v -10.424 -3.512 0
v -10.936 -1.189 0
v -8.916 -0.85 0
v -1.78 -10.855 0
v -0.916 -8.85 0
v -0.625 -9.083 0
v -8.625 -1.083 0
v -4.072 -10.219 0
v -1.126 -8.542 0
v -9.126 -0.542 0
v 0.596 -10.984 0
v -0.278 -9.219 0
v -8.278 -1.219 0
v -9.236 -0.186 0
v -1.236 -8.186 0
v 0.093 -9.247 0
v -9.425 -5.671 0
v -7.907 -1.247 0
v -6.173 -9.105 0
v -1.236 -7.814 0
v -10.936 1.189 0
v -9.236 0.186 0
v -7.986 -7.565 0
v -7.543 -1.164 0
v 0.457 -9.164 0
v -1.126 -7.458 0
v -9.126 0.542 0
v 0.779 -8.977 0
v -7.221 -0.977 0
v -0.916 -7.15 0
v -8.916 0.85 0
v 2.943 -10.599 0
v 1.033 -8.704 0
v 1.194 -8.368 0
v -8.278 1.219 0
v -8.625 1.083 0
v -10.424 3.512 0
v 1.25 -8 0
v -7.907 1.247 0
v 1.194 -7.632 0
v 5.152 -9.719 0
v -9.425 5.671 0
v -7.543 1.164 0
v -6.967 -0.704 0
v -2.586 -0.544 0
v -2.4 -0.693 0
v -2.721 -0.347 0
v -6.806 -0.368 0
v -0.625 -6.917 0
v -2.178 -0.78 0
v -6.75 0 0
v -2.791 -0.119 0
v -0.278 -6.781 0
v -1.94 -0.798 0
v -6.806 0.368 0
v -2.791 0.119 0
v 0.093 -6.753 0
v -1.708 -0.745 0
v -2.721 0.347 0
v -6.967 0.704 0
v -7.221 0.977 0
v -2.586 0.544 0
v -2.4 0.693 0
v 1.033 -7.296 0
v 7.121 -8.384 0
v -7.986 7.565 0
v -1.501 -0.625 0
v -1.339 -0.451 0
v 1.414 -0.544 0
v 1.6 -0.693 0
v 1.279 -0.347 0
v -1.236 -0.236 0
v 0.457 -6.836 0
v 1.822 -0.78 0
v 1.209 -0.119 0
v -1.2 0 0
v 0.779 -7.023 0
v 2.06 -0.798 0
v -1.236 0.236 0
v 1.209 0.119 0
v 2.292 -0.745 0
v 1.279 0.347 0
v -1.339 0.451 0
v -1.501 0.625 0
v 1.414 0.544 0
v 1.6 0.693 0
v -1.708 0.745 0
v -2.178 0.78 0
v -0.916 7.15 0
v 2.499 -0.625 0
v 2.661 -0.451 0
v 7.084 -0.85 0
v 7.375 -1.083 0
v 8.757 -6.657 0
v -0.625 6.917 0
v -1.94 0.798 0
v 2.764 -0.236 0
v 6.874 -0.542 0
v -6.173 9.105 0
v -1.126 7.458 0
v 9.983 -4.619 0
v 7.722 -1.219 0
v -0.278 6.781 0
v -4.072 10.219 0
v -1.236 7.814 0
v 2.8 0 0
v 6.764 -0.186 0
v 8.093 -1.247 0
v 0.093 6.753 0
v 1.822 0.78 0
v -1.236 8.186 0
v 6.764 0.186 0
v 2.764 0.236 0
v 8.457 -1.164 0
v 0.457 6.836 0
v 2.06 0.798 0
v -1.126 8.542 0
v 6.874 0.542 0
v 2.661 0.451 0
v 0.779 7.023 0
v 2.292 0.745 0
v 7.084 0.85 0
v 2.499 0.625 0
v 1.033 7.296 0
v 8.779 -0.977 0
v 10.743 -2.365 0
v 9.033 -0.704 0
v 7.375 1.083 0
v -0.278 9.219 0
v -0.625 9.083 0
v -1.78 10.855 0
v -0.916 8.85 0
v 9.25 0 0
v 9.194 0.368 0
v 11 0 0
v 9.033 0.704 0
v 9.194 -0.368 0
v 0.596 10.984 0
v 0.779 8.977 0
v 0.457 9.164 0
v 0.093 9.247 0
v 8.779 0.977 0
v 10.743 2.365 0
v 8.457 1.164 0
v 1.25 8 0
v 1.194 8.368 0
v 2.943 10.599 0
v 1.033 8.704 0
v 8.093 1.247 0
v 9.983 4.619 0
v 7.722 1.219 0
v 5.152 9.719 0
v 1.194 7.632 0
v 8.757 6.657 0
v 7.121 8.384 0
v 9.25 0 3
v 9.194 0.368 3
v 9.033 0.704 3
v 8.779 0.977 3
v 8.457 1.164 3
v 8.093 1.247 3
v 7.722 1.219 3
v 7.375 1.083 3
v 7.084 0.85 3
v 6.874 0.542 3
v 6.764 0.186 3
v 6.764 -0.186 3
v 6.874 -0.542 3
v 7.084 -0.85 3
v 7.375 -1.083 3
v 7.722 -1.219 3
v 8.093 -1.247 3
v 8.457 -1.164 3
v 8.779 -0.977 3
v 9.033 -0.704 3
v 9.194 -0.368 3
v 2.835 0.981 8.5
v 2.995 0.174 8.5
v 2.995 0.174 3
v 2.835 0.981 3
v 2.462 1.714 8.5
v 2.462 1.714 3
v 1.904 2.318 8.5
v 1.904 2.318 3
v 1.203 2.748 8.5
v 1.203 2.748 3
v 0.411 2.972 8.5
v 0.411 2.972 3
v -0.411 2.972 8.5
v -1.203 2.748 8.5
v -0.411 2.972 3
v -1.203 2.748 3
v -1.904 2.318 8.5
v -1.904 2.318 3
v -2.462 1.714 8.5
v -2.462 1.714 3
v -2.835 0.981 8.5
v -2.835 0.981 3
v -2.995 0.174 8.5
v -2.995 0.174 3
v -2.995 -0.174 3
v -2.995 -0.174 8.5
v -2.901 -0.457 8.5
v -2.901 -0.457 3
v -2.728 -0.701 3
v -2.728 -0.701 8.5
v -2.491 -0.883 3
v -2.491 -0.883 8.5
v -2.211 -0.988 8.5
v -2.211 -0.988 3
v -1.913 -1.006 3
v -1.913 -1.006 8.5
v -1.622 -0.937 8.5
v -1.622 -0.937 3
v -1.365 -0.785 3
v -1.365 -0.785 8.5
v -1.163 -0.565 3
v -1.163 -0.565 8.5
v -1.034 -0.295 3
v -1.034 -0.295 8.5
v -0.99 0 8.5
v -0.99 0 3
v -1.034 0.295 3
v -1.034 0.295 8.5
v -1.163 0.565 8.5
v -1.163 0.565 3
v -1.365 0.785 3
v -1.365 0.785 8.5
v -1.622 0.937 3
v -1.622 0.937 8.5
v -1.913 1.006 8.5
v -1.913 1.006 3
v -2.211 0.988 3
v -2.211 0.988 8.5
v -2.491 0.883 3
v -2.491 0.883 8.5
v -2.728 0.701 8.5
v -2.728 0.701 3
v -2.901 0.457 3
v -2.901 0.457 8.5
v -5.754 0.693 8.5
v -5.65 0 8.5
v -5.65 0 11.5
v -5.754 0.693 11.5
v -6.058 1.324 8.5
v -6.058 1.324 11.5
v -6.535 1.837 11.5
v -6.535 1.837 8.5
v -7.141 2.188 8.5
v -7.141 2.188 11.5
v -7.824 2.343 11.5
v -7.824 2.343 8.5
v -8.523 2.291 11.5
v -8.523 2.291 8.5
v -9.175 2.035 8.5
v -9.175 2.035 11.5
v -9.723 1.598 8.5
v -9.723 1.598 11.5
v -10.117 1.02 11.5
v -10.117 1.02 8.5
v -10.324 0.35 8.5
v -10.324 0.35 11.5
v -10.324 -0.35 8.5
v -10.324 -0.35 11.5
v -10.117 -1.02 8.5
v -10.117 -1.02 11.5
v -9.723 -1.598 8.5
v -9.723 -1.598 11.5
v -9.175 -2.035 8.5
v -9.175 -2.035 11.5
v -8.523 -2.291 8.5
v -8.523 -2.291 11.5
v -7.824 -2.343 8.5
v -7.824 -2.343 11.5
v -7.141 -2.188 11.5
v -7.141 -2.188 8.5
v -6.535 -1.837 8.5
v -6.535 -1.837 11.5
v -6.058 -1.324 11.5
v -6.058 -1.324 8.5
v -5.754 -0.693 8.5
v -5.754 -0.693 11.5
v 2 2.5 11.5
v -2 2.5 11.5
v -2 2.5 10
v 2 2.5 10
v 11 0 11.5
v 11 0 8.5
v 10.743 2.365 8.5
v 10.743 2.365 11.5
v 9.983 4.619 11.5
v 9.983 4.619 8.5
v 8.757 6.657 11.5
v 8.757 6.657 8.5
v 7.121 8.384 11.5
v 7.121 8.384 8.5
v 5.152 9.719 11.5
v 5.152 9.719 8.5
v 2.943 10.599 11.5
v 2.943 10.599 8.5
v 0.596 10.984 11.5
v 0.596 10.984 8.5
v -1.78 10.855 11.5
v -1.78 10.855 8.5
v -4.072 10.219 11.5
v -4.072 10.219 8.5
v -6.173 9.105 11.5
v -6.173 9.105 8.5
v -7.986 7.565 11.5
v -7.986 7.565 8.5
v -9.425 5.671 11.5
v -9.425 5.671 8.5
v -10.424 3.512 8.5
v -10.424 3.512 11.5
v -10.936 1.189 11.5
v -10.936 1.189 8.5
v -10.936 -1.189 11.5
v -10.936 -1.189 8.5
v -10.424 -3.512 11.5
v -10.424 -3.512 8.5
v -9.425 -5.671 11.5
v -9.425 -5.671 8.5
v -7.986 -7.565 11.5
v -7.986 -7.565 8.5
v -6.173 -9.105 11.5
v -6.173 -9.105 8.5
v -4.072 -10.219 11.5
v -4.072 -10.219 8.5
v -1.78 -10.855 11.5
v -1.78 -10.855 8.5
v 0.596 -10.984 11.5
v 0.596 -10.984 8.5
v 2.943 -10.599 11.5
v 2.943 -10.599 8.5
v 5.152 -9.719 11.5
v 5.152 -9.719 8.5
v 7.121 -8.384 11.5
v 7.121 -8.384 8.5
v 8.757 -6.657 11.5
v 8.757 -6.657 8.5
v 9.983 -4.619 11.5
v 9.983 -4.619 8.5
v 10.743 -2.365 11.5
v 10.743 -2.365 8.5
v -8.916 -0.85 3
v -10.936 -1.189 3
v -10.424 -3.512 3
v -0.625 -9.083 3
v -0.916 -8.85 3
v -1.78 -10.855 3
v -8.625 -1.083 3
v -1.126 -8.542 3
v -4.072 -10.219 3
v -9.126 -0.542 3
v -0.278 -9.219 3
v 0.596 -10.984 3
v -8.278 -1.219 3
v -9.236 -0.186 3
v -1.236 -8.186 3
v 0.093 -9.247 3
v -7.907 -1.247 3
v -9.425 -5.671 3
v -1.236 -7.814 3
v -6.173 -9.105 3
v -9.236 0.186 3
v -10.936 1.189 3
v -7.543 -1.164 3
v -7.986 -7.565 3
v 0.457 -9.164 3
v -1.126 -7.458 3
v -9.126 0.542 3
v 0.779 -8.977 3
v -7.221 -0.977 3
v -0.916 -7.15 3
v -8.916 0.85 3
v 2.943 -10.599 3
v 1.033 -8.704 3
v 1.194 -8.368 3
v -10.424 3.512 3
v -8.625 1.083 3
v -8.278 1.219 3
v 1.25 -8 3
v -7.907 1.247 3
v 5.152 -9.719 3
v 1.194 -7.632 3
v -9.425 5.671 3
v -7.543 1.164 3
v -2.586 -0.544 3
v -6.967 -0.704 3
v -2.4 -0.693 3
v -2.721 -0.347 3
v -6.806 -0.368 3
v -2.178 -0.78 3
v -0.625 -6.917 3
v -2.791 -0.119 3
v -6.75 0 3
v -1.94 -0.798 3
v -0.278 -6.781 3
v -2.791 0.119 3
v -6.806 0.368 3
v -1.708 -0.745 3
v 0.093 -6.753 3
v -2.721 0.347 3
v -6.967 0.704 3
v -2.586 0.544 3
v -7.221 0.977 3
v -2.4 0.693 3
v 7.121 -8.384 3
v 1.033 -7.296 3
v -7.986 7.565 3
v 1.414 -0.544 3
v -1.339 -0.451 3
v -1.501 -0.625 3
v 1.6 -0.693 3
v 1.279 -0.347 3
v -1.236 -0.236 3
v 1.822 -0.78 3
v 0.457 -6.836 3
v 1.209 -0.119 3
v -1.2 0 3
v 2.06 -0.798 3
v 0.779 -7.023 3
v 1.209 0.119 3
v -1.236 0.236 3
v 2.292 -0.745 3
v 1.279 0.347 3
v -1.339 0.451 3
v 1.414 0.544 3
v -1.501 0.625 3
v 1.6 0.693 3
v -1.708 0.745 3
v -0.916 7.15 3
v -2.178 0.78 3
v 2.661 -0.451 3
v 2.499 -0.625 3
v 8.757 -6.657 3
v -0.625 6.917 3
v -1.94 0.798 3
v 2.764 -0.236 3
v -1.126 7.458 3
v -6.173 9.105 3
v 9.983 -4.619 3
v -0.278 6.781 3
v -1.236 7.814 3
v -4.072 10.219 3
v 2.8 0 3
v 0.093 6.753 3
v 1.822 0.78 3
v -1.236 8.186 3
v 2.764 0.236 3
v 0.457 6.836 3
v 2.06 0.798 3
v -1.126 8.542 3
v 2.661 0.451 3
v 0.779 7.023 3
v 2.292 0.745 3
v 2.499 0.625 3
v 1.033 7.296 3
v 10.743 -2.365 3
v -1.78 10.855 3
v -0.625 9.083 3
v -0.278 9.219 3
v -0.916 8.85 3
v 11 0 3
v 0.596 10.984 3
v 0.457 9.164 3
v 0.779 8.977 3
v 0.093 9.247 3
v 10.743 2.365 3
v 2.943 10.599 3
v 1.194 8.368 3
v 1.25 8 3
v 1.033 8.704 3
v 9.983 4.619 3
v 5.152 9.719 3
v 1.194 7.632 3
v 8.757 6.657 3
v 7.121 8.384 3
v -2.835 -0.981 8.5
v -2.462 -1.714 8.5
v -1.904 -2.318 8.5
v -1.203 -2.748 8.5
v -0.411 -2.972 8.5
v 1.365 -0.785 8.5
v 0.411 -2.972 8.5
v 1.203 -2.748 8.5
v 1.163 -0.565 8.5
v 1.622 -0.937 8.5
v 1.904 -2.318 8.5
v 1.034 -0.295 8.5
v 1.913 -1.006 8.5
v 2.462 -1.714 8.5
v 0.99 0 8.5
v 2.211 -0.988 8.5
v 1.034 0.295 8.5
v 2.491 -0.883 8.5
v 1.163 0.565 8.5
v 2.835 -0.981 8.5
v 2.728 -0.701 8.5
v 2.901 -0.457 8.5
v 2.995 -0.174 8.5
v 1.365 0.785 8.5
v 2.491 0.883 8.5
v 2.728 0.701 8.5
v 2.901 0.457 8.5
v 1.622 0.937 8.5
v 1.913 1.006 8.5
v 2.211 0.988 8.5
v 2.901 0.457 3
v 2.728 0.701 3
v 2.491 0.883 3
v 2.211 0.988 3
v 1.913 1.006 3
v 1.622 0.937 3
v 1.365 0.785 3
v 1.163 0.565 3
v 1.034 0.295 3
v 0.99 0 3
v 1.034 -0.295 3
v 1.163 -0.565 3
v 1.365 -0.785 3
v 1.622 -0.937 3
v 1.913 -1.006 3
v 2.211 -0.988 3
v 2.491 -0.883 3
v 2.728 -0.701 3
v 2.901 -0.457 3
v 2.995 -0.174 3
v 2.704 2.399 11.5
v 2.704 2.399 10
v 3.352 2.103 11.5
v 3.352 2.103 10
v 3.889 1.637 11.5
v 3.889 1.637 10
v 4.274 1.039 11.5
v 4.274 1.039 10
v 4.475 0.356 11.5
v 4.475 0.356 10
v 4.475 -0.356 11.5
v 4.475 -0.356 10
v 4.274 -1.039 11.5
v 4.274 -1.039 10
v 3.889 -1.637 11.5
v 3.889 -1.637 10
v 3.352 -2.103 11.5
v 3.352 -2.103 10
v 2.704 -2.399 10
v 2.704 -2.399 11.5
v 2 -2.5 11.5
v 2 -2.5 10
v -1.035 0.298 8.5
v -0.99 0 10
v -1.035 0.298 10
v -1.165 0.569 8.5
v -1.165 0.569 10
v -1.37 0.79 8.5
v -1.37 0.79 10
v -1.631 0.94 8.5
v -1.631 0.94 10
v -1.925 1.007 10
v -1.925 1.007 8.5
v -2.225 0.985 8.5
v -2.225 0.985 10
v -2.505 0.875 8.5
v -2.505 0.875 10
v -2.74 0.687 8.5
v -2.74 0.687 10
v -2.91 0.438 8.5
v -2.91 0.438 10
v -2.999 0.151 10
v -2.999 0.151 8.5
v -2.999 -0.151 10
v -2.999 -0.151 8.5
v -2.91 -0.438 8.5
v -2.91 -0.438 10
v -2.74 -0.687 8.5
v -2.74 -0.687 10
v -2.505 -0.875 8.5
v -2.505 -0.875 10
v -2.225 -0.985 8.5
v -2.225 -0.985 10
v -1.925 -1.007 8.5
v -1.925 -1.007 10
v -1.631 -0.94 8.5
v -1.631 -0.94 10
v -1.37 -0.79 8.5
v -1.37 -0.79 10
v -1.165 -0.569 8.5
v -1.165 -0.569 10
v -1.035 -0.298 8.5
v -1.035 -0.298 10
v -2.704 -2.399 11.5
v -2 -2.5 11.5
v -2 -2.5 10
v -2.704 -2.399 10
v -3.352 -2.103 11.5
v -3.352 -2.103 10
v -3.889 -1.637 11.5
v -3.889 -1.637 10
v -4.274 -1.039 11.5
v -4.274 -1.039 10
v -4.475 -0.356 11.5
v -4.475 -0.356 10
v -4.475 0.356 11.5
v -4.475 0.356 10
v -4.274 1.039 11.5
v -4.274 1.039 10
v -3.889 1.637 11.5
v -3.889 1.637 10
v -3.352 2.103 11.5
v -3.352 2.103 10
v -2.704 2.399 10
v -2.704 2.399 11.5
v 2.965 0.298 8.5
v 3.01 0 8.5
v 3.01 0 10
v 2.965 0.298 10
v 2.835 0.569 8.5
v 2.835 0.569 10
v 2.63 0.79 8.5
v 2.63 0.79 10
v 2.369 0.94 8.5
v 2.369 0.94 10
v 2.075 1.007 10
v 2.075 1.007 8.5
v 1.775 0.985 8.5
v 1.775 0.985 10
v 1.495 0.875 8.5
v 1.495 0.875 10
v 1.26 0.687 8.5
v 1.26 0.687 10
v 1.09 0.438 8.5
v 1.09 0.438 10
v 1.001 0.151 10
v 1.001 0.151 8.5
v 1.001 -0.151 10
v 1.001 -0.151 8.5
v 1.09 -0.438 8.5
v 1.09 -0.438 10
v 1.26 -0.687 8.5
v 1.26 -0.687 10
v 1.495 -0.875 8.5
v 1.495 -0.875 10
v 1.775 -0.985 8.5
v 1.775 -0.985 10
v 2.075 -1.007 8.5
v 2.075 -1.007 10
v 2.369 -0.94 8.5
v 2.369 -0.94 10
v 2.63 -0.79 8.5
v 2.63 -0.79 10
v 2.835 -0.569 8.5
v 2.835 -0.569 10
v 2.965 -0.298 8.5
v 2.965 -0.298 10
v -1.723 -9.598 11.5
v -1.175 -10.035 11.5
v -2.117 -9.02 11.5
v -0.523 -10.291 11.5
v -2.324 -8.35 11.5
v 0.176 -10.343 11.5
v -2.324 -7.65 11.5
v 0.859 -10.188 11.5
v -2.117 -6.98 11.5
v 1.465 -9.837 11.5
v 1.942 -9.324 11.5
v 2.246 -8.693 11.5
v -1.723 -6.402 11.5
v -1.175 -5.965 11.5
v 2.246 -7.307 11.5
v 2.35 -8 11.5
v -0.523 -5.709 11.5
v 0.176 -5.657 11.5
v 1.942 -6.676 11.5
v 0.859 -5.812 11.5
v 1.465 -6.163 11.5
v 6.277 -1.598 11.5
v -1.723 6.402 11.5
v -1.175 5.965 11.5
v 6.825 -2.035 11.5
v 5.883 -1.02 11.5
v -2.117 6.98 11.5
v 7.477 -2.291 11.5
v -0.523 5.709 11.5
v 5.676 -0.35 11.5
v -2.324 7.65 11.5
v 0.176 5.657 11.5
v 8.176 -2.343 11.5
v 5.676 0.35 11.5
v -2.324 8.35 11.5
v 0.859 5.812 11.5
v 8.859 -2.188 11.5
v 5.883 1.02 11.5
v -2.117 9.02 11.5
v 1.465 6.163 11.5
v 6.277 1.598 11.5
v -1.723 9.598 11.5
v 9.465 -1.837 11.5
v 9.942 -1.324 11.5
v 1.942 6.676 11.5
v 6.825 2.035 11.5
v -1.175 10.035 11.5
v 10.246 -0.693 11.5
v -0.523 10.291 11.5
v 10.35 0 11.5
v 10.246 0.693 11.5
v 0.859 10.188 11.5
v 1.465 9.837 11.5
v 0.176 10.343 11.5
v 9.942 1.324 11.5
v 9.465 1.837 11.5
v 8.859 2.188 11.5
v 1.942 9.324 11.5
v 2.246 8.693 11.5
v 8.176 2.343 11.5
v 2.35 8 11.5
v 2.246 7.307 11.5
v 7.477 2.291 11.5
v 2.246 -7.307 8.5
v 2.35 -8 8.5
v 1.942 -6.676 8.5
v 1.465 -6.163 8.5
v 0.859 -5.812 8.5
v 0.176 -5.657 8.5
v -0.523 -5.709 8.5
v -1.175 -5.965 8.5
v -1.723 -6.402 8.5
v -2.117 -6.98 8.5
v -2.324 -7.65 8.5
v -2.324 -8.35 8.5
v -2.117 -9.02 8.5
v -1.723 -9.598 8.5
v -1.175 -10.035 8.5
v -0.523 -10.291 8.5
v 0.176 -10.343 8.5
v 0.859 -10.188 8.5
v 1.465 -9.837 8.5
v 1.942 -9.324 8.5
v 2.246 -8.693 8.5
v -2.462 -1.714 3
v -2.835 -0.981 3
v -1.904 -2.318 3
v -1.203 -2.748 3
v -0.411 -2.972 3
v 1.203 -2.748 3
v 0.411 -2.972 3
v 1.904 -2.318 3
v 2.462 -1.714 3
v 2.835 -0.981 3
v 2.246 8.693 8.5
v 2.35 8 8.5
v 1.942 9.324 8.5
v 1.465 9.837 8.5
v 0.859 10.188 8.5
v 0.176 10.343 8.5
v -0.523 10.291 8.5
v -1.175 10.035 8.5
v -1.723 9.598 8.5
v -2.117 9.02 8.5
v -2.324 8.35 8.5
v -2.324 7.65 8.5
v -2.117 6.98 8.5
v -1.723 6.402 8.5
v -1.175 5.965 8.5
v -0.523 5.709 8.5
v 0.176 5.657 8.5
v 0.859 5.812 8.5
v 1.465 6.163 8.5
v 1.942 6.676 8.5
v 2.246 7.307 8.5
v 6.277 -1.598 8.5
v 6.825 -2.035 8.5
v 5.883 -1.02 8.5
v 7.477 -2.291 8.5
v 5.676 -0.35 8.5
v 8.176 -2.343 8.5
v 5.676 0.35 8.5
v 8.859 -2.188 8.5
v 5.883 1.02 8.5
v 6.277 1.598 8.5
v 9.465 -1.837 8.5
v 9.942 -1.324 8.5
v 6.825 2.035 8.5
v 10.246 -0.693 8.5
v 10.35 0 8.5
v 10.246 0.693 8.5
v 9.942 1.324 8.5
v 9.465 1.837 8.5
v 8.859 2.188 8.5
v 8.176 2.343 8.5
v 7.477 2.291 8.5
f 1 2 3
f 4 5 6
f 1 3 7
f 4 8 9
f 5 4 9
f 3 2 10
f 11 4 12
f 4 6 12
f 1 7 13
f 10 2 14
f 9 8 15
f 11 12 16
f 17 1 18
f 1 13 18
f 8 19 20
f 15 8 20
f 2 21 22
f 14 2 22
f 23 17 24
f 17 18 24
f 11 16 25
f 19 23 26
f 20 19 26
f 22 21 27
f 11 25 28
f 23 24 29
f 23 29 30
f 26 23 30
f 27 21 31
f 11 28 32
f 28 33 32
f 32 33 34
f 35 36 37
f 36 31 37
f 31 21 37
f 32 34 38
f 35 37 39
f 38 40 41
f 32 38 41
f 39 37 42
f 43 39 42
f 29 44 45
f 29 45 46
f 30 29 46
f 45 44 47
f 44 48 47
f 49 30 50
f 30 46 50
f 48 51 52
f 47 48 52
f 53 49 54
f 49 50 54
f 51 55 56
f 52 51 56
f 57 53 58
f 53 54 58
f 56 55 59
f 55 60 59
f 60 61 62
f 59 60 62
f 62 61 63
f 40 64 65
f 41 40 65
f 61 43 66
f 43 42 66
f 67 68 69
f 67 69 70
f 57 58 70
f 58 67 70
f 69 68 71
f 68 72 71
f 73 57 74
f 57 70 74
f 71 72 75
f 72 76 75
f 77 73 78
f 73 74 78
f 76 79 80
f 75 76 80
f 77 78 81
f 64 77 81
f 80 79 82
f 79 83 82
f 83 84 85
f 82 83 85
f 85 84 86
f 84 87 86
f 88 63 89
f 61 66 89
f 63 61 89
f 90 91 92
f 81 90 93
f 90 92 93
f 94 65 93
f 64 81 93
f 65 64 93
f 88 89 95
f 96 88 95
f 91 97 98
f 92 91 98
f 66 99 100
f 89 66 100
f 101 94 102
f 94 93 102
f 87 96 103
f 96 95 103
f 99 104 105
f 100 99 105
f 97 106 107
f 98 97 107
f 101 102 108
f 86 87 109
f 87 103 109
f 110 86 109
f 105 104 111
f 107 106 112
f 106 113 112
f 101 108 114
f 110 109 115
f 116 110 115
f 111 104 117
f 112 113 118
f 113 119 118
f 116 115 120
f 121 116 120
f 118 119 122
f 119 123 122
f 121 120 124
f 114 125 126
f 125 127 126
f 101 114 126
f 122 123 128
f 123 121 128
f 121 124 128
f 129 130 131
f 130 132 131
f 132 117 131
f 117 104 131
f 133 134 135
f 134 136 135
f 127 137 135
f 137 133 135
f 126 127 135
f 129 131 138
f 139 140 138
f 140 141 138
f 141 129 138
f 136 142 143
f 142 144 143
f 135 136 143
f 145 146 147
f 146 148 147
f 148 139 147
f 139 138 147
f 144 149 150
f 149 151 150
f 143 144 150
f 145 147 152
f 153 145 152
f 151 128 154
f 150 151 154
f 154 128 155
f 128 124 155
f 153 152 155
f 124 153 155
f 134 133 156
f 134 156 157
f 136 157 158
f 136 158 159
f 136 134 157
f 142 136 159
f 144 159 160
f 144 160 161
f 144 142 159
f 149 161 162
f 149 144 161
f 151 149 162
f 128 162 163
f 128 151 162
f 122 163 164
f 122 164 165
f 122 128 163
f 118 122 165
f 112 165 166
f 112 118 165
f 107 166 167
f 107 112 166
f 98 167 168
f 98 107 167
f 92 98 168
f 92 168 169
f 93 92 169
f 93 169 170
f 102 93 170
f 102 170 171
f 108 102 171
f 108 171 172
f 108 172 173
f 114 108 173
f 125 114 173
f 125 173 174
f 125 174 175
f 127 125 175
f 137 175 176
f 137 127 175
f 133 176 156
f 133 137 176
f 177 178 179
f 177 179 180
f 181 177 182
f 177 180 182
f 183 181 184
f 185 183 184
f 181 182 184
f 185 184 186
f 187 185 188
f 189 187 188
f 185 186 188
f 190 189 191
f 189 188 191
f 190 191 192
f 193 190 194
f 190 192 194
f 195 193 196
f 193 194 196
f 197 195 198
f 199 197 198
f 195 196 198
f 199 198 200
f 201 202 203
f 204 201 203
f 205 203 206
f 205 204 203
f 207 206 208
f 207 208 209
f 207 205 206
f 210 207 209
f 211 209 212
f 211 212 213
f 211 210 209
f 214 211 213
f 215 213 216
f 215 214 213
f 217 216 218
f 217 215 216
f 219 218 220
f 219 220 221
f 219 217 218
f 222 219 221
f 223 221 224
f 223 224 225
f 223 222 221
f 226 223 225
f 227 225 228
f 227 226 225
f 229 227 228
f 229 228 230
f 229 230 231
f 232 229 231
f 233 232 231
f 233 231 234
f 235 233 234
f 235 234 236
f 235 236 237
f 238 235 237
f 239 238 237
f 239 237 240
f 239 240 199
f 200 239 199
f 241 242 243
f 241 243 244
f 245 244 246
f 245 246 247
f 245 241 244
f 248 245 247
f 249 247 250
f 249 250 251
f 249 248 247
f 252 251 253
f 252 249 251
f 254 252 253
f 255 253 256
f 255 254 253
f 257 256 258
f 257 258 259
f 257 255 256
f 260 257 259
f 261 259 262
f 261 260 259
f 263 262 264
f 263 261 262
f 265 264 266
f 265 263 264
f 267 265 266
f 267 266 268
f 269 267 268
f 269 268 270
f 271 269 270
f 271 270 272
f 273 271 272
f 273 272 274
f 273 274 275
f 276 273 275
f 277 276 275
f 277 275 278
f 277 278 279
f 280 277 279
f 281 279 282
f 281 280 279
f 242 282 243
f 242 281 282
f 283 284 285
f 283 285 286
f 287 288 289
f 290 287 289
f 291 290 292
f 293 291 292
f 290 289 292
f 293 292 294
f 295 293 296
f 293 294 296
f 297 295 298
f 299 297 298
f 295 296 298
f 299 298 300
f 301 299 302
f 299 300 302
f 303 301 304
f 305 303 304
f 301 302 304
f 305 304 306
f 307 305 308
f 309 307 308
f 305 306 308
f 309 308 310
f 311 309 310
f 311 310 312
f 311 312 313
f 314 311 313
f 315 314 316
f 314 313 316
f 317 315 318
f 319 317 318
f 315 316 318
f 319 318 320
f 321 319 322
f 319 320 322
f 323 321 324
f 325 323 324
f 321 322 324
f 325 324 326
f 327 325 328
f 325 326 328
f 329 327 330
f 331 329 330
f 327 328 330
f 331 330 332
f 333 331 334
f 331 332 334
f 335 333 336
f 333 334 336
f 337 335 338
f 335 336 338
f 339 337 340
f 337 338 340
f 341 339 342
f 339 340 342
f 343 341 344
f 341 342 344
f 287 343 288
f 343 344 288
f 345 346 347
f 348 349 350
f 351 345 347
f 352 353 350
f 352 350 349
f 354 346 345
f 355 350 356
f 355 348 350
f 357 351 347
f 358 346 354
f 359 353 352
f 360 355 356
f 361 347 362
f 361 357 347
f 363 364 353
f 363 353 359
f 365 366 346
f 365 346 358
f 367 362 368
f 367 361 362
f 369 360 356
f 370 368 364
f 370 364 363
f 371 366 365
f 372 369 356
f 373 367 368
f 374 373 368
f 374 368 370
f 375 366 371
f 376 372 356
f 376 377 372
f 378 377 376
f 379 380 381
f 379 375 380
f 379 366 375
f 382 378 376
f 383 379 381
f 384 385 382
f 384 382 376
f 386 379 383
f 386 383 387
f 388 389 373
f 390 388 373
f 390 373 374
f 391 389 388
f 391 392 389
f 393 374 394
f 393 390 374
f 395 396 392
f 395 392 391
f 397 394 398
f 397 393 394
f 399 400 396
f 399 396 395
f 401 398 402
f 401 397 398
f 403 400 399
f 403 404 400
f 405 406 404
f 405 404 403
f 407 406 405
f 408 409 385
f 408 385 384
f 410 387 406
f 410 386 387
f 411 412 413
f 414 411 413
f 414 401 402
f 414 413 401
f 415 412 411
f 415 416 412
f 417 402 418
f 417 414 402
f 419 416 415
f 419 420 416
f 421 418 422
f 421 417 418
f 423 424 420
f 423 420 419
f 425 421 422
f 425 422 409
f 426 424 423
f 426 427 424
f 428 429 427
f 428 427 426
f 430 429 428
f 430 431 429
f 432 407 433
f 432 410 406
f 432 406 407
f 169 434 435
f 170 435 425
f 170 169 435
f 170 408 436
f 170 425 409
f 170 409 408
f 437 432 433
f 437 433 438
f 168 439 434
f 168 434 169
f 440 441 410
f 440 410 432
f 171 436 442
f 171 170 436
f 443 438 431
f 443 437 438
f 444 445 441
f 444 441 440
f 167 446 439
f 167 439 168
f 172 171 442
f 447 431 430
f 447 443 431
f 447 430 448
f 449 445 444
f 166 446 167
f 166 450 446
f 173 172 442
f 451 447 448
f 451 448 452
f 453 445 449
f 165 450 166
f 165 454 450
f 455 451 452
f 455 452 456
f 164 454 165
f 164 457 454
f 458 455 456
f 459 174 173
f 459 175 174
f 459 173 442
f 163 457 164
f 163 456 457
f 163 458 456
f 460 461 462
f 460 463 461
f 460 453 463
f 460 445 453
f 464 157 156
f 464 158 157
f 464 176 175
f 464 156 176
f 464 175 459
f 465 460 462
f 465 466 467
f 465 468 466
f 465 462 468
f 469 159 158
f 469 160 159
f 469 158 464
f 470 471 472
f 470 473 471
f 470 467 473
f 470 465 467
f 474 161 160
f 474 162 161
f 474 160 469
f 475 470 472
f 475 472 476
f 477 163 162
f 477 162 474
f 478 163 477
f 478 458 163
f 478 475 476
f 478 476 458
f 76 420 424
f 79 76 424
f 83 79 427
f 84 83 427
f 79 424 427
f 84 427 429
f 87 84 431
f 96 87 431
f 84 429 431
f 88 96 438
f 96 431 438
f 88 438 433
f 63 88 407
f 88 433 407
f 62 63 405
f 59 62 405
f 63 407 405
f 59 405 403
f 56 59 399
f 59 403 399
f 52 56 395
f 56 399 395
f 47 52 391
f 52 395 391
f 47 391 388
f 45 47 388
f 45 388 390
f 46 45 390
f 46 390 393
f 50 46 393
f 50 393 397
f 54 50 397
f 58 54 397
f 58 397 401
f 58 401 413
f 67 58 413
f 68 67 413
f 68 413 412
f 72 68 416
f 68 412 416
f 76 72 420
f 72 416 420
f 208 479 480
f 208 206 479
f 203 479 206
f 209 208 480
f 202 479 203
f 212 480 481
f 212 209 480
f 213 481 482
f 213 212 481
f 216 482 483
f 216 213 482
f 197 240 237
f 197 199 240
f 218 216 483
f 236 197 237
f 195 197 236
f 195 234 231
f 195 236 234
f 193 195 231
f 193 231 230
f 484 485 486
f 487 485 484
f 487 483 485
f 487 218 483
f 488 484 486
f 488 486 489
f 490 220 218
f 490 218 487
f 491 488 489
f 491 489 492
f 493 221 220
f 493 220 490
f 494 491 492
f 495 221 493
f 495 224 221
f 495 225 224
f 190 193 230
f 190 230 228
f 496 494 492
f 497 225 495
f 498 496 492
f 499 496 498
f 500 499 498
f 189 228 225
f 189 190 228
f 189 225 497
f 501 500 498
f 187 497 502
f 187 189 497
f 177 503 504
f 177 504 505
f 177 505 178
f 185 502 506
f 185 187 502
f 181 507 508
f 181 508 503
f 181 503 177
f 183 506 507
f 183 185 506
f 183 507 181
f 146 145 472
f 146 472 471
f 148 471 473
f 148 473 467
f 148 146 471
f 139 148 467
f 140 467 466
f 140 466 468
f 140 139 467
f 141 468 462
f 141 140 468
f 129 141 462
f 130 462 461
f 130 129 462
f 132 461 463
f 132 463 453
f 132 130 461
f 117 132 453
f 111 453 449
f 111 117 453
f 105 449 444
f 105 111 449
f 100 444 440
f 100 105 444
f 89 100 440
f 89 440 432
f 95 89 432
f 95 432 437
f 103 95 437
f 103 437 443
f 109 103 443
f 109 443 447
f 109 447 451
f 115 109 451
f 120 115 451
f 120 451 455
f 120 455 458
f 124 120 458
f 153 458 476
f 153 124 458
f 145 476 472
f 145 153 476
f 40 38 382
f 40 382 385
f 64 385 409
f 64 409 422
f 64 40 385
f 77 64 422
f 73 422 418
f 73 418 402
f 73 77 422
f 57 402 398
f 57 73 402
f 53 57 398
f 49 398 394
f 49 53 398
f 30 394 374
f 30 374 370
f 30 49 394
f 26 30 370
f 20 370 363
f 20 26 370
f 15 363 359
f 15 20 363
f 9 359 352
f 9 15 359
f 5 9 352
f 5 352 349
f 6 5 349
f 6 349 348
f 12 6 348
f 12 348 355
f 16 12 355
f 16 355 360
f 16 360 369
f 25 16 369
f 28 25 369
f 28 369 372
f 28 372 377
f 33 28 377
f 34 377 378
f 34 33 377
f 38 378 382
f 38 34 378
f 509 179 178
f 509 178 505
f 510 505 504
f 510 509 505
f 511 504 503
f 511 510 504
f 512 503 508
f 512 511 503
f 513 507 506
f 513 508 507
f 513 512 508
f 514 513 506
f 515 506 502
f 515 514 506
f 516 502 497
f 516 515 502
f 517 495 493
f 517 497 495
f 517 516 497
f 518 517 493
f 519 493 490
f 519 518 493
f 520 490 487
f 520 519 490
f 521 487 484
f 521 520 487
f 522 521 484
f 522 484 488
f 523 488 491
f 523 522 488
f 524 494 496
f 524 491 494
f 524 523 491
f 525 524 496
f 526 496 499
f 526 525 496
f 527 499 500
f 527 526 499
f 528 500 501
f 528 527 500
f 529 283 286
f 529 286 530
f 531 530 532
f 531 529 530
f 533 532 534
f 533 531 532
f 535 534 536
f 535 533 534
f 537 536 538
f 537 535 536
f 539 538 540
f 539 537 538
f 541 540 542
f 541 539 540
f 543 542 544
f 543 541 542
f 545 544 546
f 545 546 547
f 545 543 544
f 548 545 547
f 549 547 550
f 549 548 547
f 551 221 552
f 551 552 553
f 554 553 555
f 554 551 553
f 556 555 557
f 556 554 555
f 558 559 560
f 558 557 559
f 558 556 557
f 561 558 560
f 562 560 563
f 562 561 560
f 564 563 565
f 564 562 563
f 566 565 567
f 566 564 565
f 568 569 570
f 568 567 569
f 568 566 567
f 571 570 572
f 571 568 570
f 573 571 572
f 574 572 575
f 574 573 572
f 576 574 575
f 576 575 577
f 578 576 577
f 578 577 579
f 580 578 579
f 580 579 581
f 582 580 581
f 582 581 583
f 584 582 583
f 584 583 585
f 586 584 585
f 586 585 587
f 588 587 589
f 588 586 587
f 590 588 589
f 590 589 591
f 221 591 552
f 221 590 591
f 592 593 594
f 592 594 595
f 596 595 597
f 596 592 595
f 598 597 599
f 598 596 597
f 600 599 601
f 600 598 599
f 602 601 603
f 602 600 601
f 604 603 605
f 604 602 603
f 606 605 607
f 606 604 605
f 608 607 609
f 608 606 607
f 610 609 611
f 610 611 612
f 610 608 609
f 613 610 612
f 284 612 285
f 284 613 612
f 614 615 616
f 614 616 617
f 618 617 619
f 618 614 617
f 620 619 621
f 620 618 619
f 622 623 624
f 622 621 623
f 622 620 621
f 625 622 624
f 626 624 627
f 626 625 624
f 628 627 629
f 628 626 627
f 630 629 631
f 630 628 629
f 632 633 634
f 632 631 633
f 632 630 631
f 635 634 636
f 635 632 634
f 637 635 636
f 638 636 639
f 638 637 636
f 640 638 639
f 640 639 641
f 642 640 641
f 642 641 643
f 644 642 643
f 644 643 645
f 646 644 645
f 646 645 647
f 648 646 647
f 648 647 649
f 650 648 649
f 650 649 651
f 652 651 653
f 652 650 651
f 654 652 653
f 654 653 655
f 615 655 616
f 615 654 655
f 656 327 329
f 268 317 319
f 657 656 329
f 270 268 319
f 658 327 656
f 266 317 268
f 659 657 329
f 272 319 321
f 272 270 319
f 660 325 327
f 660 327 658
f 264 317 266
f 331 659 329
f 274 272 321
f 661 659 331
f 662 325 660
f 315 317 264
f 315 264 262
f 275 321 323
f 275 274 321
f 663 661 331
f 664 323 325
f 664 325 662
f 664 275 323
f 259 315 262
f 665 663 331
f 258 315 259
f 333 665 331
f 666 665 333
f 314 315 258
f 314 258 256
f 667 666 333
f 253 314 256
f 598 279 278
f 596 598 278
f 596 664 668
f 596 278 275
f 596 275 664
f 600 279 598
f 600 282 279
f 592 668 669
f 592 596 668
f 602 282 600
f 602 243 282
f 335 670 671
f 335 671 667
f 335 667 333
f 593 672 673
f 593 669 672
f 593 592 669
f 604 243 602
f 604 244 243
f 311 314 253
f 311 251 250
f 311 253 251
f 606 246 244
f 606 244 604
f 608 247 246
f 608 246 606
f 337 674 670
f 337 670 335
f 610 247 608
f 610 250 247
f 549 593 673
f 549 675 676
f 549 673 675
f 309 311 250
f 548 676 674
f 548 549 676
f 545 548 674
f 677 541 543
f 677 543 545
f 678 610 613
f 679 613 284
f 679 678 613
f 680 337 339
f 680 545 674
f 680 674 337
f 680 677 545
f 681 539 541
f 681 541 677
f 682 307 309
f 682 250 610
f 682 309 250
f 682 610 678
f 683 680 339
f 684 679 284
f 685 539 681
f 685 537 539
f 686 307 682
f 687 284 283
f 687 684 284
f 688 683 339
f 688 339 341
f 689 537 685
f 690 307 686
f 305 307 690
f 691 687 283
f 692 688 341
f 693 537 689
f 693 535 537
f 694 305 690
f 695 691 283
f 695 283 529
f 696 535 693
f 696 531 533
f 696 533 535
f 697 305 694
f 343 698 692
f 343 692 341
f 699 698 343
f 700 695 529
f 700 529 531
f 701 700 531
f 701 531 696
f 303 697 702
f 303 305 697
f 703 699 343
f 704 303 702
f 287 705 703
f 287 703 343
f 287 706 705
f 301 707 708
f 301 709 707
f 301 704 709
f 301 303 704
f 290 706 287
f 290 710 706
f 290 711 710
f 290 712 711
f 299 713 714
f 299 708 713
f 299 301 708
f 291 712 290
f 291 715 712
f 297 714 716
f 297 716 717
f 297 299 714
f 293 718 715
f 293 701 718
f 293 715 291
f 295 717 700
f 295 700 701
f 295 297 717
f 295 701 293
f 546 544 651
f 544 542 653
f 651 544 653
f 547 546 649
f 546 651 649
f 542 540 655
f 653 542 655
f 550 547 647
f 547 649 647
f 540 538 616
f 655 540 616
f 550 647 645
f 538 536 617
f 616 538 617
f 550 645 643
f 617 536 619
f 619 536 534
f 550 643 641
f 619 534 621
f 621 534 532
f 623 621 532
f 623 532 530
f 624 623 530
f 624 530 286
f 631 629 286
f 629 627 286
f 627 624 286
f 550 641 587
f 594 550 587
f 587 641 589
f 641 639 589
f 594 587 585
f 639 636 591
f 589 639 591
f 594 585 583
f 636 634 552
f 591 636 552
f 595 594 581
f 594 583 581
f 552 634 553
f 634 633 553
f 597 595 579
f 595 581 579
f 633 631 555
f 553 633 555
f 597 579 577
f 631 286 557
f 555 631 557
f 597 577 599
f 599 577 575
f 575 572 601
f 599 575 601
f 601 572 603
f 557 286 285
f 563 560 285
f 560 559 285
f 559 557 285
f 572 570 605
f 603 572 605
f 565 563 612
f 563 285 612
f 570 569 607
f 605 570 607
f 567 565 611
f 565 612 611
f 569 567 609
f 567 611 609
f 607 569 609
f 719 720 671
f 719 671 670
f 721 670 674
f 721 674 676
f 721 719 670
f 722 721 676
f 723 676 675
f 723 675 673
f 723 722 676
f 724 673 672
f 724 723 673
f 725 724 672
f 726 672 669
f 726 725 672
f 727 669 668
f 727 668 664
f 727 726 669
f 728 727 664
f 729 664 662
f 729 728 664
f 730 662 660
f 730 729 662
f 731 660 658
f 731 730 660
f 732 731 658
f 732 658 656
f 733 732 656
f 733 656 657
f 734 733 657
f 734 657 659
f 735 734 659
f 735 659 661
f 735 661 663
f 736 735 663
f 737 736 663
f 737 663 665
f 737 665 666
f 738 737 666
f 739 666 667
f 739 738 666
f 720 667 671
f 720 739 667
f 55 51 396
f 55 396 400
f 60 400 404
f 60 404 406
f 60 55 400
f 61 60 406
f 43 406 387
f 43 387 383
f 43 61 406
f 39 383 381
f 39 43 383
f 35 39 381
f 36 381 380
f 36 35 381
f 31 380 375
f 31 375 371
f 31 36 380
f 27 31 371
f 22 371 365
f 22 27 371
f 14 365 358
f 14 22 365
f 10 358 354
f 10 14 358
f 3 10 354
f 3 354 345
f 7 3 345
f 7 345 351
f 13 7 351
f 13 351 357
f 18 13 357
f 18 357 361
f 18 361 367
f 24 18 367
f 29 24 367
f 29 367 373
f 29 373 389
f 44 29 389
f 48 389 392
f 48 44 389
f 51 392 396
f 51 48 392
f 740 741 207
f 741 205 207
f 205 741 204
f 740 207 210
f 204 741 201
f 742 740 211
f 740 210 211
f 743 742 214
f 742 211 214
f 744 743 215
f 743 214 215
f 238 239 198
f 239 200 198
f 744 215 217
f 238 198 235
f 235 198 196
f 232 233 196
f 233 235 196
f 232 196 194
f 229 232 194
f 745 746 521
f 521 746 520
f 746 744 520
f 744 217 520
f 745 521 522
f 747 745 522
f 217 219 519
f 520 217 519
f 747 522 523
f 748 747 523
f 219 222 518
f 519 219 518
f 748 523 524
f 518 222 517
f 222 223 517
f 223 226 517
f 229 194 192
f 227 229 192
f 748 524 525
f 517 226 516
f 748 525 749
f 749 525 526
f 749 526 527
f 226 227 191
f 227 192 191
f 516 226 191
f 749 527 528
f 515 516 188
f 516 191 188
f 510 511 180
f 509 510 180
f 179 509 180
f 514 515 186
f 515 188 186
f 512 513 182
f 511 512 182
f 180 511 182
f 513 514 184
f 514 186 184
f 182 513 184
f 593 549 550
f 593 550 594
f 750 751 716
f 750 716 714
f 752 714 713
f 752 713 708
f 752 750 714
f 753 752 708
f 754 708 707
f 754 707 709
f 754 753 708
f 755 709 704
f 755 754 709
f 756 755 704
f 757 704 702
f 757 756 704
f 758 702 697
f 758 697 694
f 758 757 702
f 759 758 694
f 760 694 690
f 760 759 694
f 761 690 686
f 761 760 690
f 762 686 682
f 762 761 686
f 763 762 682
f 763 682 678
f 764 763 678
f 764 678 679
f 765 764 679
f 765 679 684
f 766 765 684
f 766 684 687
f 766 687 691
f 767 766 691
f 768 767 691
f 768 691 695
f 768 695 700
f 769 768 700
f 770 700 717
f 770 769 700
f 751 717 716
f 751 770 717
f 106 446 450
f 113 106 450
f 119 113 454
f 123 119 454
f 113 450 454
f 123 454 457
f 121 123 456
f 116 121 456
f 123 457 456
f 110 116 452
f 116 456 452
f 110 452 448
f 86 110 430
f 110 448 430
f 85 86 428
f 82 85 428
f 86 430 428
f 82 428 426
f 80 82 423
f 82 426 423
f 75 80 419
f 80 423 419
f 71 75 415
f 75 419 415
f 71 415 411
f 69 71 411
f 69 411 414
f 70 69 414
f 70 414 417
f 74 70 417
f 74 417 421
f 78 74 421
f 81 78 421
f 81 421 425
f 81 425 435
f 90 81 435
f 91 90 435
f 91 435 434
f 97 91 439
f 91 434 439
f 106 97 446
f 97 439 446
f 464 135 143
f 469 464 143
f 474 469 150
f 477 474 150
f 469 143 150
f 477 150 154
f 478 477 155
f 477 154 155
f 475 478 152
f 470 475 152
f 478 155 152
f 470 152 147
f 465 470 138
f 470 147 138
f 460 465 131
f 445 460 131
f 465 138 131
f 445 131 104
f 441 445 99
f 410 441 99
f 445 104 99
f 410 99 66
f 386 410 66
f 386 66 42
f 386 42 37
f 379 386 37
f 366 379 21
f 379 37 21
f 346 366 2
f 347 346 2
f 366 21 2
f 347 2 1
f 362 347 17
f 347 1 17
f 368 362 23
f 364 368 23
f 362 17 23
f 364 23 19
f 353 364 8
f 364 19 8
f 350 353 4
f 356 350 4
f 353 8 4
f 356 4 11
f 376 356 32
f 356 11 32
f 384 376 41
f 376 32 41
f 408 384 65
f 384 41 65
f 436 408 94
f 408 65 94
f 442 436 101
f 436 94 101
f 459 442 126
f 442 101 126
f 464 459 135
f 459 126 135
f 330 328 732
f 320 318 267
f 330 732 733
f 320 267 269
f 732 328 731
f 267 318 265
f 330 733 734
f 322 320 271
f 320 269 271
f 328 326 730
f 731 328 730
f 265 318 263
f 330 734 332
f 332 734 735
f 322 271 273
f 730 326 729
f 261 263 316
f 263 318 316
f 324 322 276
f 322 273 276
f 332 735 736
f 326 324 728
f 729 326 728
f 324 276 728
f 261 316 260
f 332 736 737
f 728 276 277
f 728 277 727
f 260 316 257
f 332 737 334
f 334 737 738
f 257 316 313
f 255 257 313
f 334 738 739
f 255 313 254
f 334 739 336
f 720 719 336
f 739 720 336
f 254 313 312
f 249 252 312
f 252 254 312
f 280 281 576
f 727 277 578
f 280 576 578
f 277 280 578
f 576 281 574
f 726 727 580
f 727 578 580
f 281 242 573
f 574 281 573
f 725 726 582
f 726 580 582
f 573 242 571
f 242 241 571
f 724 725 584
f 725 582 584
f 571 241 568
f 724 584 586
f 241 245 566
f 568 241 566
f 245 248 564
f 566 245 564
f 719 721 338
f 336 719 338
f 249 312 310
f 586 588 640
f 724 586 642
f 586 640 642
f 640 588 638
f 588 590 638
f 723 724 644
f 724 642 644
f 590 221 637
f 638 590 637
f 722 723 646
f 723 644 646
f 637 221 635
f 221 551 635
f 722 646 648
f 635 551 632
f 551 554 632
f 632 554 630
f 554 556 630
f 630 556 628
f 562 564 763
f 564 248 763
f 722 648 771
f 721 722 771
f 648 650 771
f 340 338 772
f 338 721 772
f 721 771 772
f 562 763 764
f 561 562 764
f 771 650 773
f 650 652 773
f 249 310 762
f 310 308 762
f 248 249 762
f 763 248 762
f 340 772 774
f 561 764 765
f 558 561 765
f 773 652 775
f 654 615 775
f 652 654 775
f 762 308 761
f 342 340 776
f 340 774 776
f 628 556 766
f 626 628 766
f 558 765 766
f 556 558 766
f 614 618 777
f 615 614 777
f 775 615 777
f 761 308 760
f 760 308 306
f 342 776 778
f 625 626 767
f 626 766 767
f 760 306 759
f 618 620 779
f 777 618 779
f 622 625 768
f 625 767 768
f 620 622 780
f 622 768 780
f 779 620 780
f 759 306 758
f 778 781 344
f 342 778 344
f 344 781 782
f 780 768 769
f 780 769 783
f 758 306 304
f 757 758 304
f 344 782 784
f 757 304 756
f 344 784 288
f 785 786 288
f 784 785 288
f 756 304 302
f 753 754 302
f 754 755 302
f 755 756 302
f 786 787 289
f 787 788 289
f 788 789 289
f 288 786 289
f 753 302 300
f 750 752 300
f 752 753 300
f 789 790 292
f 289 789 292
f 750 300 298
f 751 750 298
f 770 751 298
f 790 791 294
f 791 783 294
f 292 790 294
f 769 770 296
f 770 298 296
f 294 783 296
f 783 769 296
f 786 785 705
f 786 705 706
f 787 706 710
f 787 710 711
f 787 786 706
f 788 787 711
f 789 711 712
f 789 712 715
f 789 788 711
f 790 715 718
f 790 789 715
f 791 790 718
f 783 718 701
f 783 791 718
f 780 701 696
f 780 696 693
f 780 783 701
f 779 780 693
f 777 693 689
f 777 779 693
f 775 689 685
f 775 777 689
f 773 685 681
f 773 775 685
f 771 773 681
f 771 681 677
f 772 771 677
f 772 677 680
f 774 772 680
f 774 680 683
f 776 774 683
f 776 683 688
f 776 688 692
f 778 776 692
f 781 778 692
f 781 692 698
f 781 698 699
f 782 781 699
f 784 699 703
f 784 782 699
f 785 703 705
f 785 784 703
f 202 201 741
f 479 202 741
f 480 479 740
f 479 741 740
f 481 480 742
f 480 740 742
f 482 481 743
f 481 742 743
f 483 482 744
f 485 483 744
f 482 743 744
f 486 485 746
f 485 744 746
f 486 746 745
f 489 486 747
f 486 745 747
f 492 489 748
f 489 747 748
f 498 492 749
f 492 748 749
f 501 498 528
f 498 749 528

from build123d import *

# Parameters (mm, degrees)
SKETCH_1_R          = 11
SKETCH_1_R_2        = 1.25
EXTRUDE_1_DEPTH     = 3
SKETCH_2_R          = 3
EXTRUDE_2_DEPTH     = 5.5
SKETCH_3_R          = 11
SKETCH_3_R_2        = 2.35
EXTRUDE_3_DEPTH     = 3
CUT_EXTRUDE_START   = -11.5
SKETCH_8_R          = 1.01
CUT_EXTRUDE_4_DEPTH = 11.5
SKETCH_9_R          = 0.8
CUT_EXTRUDE_5_DEPTH = 3
CUT_EXTRUDE_6_DEPTH = 1.5


with BuildPart() as part:
    # ｽｹｯﾁ1 → ﾎﾞｽ - 押し出し1 (new body)
    with BuildSketch(Plane.XY):
        Circle(SKETCH_1_R)
        with Locations((-8, 0)):
            Circle(SKETCH_1_R_2, mode=Mode.SUBTRACT)
        with Locations((0, 8)):
            Circle(SKETCH_1_R_2, mode=Mode.SUBTRACT)
        with Locations((8, 0)):
            Circle(SKETCH_1_R_2, mode=Mode.SUBTRACT)
        with Locations((0, -8)):
            Circle(SKETCH_1_R_2, mode=Mode.SUBTRACT)
    extrude(amount=EXTRUDE_1_DEPTH)

    # ｽｹｯﾁ9 → ｶｯﾄ - 押し出し5 (cut)
    with BuildSketch(Plane.XY.offset(3)):
        with Locations((-2, 0)):
            Circle(SKETCH_9_R)
        with Locations((2, 0)):
            Circle(SKETCH_9_R)
    extrude(amount=-CUT_EXTRUDE_5_DEPTH, mode=Mode.SUBTRACT)


with BuildPart() as body_2:
    # ｽｹｯﾁ2 → ﾎﾞｽ - 押し出し2 (new body)
    with BuildSketch(Plane.XY.offset(3)):
        Circle(SKETCH_2_R)
    extrude(amount=EXTRUDE_2_DEPTH)


with BuildPart() as body_3:
    # ｽｹｯﾁ3 → ﾎﾞｽ - 押し出し3 (new body)
    with BuildSketch(Plane.XY.offset(8.5)):
        Circle(SKETCH_3_R)
        with Locations((-8, 0)):
            Circle(SKETCH_3_R_2, mode=Mode.SUBTRACT)
        with Locations((0, 8)):
            Circle(SKETCH_3_R_2, mode=Mode.SUBTRACT)
        with Locations((8, 0)):
            Circle(SKETCH_3_R_2, mode=Mode.SUBTRACT)
        with Locations((0, -8)):
            Circle(SKETCH_3_R_2, mode=Mode.SUBTRACT)
    extrude(amount=EXTRUDE_3_DEPTH)


with BuildPart() as cut_extrude_4_tool:
    # ｽｹｯﾁ8 → ｶｯﾄ - 押し出し4 (new body)
    with BuildSketch(Plane.XY.offset(11.5).offset(CUT_EXTRUDE_START)):
        with Locations((-2, 0)):
            Circle(SKETCH_8_R)
        with Locations((2, 0)):
            Circle(SKETCH_8_R)
    extrude(amount=CUT_EXTRUDE_4_DEPTH)


with BuildPart() as body_2_1:
    add(body_2.part)

    # ｶｯﾄ - 押し出し4: cut by cut_extrude_4_tool
    add(cut_extrude_4_tool.part, mode=Mode.SUBTRACT)


with BuildPart() as body_3_1:
    add(body_3.part)

    # ｶｯﾄ - 押し出し4: cut by cut_extrude_4_tool
    add(cut_extrude_4_tool.part, mode=Mode.SUBTRACT)

    # ｽｹｯﾁ11 → ｶｯﾄ - 押し出し6 (cut)
    with BuildSketch(Plane.XY.offset(11.5)):
        with BuildLine():
            Line((-2, 2.5), (2, 2.5))
            ThreePointArc((2, 2.5), (4.5, 0), (2, -2.5))
            Line((2, -2.5), (-2, -2.5))
            ThreePointArc((-2, -2.5), (-4.5, 0), (-2, 2.5))
        make_face()
    extrude(amount=-CUT_EXTRUDE_6_DEPTH, mode=Mode.SUBTRACT)


solid = Compound([part.part, body_2_1.part, body_3_1.part])
